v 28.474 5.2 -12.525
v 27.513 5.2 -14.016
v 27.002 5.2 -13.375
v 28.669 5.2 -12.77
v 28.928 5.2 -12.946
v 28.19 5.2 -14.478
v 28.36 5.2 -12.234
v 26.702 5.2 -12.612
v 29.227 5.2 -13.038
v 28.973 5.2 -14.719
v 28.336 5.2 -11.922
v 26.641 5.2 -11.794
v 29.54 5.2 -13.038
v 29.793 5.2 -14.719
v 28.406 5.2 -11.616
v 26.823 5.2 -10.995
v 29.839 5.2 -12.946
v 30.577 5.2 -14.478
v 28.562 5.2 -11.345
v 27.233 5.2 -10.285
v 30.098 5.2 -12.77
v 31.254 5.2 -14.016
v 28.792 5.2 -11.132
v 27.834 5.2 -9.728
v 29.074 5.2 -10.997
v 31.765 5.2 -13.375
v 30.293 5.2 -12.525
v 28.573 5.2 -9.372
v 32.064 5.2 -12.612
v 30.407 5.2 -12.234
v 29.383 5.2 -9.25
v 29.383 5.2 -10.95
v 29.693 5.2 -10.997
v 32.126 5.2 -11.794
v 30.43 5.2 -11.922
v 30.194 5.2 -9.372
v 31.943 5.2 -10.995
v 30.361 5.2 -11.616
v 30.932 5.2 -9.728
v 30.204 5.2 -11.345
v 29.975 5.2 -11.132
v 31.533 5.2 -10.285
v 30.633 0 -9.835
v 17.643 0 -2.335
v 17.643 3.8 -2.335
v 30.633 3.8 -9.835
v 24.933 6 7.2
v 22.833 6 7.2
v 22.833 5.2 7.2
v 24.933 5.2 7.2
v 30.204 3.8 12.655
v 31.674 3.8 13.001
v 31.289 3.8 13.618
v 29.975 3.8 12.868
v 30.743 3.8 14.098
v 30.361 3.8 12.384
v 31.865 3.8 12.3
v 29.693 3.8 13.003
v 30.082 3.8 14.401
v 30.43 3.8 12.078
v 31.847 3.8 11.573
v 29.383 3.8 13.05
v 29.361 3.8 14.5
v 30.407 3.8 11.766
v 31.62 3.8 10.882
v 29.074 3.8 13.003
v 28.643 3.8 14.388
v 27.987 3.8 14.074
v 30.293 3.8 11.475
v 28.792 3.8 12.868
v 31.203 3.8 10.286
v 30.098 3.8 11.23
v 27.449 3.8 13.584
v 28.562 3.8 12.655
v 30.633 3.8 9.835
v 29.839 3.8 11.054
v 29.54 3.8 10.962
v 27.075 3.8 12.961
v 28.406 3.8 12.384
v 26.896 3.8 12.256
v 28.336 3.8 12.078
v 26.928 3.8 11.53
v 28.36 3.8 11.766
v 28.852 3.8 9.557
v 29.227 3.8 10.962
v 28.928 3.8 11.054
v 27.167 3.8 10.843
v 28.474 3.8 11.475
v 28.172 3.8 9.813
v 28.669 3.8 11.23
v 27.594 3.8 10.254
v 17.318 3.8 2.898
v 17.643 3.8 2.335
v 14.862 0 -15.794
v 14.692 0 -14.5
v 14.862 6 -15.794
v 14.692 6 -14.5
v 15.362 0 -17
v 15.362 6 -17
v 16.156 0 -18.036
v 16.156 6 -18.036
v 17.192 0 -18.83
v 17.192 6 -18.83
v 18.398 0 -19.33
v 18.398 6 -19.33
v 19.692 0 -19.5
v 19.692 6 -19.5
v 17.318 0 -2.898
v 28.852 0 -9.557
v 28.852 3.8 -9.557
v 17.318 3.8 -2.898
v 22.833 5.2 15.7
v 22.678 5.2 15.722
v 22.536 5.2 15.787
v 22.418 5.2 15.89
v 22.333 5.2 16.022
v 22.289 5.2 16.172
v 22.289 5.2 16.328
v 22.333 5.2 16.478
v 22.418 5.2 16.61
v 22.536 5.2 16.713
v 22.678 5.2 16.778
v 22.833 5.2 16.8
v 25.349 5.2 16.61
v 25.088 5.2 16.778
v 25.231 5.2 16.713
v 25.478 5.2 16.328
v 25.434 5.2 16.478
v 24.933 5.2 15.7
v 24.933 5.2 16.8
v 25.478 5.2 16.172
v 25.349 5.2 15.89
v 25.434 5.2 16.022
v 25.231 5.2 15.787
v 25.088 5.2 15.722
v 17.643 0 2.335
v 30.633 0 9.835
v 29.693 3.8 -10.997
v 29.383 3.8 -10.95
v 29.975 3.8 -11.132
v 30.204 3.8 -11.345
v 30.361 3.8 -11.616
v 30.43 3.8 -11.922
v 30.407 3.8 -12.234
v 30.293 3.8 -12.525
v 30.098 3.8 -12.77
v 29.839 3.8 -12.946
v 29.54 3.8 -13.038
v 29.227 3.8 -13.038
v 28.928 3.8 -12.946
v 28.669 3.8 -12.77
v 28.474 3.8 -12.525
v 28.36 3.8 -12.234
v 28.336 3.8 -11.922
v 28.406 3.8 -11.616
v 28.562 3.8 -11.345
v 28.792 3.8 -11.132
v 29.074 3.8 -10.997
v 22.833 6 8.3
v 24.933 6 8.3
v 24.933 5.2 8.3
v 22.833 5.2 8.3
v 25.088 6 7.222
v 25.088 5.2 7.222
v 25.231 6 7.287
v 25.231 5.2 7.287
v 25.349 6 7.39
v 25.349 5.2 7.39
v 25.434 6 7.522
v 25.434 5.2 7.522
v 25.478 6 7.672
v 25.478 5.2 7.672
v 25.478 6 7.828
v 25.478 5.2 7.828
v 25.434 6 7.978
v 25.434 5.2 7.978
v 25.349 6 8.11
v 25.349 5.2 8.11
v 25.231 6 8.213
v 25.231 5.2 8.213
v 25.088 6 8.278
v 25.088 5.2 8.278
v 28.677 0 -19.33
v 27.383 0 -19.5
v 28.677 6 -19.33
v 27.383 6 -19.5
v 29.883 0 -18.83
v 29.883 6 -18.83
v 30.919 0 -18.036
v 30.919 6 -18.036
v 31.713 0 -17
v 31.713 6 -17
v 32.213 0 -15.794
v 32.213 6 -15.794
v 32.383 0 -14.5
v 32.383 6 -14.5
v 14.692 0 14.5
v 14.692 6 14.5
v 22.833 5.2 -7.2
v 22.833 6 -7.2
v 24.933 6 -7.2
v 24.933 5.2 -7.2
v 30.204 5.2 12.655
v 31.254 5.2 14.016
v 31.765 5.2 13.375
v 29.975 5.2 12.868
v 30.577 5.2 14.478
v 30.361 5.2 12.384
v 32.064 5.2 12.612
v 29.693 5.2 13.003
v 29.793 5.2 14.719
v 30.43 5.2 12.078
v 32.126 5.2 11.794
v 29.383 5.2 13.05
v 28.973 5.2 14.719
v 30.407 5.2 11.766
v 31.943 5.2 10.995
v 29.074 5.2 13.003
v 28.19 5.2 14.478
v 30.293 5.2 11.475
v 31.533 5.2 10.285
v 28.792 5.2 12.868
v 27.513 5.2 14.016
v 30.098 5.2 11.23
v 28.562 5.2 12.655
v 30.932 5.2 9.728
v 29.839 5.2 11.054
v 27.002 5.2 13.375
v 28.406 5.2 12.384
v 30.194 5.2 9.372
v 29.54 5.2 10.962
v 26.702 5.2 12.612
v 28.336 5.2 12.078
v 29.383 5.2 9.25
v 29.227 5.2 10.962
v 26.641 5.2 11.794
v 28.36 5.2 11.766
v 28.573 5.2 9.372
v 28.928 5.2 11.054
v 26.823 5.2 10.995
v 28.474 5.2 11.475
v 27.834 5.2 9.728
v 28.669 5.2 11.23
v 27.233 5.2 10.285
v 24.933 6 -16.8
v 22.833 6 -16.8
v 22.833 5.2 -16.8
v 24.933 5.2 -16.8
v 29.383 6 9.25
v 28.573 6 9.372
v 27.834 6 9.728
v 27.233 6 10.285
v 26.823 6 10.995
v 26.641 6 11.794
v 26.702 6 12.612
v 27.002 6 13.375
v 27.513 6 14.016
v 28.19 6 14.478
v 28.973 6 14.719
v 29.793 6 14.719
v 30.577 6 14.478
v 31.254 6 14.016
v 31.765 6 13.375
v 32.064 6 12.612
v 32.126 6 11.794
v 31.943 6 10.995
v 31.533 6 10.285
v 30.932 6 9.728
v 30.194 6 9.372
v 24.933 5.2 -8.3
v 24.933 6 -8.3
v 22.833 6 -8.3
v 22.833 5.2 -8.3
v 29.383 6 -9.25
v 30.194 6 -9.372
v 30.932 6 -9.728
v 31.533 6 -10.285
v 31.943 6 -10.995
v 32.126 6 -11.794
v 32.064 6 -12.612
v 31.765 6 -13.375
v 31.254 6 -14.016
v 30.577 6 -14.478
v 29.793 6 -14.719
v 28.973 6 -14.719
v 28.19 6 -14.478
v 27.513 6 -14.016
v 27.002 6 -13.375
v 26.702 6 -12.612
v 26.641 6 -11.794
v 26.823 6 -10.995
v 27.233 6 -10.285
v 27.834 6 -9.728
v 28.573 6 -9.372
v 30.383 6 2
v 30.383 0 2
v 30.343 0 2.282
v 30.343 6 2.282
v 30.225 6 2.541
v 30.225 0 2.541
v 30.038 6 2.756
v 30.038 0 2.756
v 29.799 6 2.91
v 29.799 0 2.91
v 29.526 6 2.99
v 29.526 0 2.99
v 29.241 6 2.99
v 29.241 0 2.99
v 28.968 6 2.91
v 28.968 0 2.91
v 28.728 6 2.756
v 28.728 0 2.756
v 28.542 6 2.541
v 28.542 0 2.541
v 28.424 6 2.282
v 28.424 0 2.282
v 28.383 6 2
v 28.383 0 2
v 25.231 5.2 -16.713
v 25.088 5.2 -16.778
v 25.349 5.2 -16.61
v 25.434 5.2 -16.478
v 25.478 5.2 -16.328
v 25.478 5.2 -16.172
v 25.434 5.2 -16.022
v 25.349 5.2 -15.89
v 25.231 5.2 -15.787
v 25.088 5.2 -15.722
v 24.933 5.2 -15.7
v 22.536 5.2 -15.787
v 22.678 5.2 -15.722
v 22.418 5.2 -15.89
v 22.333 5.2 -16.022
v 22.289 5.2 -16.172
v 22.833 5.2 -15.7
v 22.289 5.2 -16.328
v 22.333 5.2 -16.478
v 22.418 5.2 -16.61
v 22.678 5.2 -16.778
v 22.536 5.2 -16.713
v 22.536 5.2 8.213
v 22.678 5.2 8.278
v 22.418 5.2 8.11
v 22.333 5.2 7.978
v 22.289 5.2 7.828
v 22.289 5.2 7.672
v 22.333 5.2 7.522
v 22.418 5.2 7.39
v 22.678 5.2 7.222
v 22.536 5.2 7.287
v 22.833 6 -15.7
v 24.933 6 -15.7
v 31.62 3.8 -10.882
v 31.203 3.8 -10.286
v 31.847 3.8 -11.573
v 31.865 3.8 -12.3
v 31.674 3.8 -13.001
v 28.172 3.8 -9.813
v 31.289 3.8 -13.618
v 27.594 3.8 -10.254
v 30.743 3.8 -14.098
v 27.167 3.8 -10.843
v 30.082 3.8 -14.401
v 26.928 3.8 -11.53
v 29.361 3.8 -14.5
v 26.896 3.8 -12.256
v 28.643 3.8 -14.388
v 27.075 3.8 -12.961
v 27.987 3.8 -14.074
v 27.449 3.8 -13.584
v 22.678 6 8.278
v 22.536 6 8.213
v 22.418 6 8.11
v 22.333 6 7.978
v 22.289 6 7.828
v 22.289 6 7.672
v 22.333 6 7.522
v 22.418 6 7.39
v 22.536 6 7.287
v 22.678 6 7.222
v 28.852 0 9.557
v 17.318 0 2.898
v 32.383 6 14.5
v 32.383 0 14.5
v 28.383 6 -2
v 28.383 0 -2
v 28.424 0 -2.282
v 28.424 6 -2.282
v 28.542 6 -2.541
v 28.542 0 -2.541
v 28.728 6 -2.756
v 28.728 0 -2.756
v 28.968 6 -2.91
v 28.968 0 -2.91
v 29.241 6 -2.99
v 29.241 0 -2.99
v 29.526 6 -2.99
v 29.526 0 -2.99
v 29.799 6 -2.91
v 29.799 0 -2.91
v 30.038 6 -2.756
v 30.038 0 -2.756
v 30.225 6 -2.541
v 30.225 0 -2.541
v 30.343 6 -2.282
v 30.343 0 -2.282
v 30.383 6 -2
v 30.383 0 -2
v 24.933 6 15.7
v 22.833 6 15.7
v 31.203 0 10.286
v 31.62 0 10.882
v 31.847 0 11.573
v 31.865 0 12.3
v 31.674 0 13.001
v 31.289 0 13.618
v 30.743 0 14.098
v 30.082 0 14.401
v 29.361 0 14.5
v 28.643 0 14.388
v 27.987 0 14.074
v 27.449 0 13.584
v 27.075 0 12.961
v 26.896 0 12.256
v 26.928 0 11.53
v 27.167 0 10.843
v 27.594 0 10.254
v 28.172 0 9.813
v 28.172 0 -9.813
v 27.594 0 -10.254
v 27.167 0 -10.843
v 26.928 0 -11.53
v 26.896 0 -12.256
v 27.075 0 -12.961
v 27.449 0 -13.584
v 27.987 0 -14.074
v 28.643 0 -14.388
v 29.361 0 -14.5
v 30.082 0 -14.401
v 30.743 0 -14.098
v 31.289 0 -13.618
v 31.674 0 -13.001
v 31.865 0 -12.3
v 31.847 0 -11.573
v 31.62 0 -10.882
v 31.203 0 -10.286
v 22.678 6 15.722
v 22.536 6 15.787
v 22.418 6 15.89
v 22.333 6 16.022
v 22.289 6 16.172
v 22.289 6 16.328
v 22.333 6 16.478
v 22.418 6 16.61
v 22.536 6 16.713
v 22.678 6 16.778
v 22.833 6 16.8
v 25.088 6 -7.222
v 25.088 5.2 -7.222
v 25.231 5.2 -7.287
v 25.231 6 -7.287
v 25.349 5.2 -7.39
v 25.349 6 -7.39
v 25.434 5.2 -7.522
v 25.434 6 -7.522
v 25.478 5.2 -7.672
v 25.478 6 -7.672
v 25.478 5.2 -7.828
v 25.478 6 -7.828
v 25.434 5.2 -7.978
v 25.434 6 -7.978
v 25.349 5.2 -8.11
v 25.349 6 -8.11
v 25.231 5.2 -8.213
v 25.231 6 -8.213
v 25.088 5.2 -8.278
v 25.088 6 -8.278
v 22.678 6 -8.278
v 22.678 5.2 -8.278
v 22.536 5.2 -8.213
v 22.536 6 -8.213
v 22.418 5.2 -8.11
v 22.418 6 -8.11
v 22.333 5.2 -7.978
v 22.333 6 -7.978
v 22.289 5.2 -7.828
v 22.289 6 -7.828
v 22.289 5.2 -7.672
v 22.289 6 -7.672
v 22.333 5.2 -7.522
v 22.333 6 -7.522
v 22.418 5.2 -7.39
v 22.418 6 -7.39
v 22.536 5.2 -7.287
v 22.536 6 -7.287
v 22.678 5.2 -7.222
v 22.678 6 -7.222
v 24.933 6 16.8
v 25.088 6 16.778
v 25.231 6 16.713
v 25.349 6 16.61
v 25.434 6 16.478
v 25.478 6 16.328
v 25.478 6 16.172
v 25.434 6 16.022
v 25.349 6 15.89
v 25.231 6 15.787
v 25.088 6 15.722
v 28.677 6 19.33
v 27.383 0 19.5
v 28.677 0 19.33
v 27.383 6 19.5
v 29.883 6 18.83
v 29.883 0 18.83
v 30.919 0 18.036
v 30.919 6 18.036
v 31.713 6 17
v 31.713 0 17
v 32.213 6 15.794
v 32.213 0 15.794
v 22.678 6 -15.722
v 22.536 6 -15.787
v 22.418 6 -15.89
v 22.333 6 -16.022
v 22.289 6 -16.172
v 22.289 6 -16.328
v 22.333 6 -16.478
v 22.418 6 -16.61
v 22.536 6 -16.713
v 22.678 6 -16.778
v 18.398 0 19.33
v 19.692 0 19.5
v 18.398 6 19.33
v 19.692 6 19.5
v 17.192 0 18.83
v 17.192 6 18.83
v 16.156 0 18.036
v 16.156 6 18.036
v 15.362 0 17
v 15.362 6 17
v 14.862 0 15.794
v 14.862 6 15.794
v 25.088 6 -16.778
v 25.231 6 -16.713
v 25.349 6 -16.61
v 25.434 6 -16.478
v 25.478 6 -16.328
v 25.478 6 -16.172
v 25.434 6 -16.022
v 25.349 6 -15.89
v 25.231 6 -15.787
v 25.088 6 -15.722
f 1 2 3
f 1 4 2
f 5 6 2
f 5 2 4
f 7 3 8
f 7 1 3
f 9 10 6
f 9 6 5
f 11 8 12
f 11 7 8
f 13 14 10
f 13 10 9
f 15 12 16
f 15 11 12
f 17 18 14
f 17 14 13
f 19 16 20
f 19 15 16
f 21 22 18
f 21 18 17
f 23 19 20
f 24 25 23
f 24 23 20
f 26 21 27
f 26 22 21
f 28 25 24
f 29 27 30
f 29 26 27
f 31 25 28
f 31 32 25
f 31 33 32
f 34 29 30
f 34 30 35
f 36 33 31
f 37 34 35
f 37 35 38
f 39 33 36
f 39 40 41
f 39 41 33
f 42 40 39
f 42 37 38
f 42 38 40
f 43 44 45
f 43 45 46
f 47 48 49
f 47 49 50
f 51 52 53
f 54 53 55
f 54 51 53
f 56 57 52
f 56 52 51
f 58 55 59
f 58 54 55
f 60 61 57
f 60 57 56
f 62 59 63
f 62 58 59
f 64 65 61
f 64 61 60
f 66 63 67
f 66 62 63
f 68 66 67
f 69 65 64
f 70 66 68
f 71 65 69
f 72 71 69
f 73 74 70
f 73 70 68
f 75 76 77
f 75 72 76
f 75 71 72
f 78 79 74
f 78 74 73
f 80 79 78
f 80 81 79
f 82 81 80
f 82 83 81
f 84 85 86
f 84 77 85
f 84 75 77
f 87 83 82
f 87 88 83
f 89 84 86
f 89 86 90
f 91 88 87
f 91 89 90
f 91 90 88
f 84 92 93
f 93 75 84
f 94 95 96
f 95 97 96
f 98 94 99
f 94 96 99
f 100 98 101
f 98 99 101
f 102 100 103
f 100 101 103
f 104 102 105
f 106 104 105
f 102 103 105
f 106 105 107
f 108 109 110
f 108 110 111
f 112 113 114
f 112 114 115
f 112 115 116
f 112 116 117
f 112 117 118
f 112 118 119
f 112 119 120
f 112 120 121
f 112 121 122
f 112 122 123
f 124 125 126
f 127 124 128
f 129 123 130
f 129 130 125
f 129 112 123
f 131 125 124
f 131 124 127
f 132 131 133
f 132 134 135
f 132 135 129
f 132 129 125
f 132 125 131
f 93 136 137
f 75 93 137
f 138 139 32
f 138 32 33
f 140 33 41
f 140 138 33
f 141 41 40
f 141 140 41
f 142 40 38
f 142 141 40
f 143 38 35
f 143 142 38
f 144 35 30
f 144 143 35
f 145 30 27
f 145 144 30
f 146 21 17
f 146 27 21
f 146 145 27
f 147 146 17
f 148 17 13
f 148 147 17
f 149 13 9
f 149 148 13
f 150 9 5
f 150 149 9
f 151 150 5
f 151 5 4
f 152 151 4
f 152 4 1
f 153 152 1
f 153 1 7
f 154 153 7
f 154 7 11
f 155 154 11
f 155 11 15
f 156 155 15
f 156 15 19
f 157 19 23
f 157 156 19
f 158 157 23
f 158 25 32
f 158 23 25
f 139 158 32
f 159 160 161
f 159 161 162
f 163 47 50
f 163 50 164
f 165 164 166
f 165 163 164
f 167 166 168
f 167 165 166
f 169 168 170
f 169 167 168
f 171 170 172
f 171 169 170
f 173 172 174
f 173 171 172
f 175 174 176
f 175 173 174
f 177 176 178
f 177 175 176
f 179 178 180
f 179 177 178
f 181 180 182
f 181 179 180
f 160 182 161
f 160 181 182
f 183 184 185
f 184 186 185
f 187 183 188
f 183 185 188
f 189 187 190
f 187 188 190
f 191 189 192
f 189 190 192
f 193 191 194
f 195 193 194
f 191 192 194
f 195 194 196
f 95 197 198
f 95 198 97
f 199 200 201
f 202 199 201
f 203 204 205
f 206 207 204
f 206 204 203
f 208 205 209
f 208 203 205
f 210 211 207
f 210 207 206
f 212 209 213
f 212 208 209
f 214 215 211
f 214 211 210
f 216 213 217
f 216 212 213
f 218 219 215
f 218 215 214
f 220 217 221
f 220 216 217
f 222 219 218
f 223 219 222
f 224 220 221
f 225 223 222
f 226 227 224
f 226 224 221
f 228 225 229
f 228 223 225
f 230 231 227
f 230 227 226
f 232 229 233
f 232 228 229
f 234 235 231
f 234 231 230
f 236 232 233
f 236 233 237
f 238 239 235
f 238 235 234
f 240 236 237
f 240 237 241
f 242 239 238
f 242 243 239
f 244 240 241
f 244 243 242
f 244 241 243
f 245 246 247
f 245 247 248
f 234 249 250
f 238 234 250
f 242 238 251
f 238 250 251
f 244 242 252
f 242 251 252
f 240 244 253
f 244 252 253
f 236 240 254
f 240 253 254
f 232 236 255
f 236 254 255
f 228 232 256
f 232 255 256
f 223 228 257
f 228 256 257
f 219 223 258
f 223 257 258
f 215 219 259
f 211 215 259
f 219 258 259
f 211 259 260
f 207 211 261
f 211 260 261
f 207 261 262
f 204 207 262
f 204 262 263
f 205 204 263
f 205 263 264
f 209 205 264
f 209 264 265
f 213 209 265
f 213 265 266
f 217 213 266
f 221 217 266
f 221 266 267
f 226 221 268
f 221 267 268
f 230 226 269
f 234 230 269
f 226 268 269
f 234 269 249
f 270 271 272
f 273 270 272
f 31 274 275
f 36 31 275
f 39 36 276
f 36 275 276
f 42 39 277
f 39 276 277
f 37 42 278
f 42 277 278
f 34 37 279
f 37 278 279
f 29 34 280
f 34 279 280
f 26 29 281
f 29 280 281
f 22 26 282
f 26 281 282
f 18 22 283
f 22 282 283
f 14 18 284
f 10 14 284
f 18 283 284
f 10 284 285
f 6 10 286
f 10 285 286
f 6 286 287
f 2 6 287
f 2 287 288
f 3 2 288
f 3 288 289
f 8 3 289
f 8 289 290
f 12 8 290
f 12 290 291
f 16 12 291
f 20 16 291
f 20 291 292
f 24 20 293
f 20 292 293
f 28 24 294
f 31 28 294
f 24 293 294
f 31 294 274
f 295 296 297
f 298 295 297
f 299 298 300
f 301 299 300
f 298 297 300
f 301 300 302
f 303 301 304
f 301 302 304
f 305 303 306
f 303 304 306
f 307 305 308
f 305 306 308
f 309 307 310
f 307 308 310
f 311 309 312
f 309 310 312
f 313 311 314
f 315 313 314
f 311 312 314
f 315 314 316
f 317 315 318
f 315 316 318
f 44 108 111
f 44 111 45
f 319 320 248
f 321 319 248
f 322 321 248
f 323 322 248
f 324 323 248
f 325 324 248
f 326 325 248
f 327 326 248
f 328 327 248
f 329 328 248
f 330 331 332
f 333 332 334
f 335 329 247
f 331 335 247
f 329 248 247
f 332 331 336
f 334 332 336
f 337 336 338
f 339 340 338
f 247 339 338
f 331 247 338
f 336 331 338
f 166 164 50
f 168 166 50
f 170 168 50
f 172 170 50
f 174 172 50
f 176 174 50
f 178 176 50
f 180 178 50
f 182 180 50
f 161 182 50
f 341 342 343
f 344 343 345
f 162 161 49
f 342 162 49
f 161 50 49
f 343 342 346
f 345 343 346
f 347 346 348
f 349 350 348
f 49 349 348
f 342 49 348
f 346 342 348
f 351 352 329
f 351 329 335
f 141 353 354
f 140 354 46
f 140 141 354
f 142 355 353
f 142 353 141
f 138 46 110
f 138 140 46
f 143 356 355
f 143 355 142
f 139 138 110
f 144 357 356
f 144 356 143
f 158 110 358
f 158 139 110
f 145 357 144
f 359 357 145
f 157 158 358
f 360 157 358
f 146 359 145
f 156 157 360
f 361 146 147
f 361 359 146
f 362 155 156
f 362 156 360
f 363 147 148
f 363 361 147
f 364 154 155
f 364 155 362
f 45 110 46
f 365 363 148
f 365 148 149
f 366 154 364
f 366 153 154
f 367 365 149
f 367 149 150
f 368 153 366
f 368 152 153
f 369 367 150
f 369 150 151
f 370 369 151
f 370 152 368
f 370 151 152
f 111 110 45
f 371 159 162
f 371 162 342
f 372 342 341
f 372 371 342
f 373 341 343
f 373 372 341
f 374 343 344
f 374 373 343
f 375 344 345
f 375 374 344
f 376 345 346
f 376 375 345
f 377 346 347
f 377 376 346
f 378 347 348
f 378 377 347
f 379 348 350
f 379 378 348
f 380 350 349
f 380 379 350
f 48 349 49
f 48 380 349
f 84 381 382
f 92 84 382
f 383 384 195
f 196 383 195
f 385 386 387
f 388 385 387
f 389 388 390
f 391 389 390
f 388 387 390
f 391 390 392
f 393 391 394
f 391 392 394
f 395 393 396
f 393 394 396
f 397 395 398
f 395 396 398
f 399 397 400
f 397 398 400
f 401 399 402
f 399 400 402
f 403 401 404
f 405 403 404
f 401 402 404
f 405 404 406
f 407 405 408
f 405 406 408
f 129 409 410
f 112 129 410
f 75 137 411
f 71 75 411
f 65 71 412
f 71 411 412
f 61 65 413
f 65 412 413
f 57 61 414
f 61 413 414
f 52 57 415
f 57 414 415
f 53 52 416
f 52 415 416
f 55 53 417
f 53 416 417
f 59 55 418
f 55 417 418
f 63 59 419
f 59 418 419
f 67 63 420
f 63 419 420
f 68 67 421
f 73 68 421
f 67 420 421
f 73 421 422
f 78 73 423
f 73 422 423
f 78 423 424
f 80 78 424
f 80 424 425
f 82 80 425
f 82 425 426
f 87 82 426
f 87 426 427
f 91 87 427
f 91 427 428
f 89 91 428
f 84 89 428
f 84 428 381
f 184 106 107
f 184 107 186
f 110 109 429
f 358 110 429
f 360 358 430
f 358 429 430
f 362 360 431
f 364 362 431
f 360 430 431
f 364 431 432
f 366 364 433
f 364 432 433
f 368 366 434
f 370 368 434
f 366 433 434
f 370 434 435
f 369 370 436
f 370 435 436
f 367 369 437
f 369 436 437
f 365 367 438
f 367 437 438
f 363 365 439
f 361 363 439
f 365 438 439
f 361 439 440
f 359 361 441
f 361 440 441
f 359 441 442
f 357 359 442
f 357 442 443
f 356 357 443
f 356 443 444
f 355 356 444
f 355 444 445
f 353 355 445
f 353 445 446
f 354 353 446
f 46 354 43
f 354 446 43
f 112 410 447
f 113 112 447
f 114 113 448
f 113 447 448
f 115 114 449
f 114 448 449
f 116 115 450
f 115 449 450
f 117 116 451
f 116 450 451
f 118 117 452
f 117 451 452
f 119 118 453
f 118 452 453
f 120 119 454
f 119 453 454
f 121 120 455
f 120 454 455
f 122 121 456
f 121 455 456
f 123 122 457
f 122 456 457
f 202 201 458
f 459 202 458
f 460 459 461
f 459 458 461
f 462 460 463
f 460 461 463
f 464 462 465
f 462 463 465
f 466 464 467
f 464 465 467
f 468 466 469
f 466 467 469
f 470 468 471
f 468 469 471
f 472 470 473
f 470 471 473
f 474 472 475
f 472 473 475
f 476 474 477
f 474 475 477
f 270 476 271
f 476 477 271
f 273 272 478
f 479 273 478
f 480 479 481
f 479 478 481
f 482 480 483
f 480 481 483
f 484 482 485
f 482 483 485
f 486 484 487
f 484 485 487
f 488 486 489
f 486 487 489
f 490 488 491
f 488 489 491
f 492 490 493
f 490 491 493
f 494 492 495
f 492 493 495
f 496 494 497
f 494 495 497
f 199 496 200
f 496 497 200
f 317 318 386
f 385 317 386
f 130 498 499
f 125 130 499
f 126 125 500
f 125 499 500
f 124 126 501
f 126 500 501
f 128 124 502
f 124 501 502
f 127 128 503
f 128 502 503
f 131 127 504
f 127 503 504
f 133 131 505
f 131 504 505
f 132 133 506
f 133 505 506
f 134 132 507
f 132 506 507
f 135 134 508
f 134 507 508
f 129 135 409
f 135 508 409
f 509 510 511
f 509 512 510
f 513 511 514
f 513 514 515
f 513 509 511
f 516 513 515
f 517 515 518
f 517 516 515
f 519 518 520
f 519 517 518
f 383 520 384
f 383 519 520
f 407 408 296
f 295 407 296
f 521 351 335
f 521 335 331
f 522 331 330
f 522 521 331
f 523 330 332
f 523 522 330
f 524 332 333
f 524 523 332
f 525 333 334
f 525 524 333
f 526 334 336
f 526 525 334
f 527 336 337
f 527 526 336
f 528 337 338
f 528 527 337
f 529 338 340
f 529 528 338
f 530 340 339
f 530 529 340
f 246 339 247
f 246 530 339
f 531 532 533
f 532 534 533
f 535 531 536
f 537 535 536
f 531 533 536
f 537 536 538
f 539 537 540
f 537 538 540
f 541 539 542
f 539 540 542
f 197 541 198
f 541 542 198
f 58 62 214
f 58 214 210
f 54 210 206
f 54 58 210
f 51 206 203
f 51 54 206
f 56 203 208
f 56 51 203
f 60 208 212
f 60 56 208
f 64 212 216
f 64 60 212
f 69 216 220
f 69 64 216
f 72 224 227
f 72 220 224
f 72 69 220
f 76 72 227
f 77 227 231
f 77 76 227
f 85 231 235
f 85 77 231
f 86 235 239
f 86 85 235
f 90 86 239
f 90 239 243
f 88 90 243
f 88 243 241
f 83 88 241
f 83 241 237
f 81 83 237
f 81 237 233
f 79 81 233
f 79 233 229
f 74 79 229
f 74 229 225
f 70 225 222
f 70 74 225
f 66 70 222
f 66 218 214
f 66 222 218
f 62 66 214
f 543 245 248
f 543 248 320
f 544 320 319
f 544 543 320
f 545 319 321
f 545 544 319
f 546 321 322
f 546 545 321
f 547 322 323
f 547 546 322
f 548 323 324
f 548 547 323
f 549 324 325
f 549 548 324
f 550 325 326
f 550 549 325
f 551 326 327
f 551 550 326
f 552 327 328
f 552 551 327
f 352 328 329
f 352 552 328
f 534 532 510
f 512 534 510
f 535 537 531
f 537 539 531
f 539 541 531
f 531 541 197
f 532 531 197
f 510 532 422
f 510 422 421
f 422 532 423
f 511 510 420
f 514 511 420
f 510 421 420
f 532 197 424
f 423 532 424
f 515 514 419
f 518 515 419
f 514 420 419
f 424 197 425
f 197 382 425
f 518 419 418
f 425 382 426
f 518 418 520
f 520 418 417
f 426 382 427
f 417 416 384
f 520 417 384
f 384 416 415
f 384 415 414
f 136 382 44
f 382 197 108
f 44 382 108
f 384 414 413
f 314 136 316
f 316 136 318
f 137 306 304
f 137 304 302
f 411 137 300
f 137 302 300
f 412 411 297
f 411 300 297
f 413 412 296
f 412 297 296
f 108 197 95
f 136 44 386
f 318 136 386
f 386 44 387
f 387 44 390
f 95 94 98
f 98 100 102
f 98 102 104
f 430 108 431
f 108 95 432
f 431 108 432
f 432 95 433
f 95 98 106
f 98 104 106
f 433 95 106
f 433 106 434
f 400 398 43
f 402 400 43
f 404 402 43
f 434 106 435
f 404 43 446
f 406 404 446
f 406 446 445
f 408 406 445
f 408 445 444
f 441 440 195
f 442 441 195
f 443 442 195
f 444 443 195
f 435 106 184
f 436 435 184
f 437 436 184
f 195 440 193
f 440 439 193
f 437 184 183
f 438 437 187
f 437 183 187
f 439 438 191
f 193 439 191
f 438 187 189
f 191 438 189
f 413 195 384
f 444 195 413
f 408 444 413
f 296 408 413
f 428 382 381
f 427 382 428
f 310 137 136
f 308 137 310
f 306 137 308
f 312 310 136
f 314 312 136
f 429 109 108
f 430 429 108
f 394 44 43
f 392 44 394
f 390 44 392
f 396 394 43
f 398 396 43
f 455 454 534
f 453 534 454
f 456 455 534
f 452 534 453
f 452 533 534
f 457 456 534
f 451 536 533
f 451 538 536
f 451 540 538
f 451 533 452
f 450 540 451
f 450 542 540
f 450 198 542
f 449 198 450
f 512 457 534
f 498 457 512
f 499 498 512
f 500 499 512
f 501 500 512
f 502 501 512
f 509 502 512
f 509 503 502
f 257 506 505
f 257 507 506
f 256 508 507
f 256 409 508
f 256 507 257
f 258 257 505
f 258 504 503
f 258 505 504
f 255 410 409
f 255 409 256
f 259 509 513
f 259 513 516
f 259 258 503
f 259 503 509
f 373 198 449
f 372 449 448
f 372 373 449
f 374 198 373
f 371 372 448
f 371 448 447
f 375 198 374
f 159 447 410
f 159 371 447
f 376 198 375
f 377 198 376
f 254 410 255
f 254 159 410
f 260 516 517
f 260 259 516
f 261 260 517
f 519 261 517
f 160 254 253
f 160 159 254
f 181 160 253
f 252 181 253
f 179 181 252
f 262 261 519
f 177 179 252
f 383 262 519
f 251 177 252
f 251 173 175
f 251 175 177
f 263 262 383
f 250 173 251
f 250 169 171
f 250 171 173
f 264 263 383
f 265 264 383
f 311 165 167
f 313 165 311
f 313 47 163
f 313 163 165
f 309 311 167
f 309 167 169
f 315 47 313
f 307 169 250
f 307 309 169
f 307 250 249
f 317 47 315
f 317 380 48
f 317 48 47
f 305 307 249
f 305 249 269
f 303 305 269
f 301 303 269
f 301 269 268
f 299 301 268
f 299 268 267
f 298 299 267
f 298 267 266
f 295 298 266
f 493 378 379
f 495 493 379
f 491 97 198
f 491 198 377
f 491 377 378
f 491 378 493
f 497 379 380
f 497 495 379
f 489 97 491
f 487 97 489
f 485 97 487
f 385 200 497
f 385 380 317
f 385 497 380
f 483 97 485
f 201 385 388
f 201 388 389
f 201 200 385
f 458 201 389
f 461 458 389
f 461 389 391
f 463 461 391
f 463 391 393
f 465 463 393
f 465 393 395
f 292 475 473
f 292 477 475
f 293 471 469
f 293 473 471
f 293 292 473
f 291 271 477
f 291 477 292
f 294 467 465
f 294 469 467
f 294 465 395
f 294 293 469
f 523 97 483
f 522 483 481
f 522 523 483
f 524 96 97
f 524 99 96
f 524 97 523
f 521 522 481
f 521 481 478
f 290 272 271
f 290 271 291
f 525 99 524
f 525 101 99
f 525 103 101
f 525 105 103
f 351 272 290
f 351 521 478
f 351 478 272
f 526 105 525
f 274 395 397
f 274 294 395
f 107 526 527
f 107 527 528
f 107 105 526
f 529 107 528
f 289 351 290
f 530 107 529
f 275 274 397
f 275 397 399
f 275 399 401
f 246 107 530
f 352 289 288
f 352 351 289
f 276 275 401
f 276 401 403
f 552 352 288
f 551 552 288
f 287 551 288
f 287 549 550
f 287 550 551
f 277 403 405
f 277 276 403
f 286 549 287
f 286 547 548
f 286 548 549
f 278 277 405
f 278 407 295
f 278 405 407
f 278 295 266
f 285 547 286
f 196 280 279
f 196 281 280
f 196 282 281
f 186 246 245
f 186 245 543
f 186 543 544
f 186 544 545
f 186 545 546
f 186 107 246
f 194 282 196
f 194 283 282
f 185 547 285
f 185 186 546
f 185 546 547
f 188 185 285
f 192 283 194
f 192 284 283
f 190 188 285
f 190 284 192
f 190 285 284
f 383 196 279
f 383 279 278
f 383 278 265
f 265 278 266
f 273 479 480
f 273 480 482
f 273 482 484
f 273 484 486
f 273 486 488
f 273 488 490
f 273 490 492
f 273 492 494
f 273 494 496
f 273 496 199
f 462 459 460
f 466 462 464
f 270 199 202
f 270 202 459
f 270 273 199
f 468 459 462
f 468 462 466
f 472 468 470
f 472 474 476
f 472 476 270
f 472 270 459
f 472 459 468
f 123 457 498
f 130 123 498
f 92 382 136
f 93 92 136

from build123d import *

# Parameters (mm, degrees)
SKETCH1_W           = 17.691665124
SKETCH1_H           = 39
SKETCH1_R           = 1.05
BOSS_EXTRUDE1_DEPTH = 6
SKETCH6_R           = 2.5
CUT_EXTRUDE1_DEPTH  = 3.8
FILLET1_R           = 5
FILLET2_R           = 5
SKETCH7_R           = 2.75
CUT_EXTRUDE2_DEPTH  = 0.8


with BuildPart() as part:
    # Sketch1 → Boss-Extrude1 (new body)
    with BuildSketch(Plane(origin=(0, 0, 0), x_dir=(1, 0, 0), z_dir=(0, 1, 0))):
        with Locations((23.537497687, 0)):
            Rectangle(SKETCH1_W, SKETCH1_H)
        with Locations(Location((29.383330249, -12, 0), (0, 0, 270))):
            Circle(SKETCH1_R, mode=Mode.SUBTRACT)
        with BuildLine():
            ThreePointArc((30.383330249, -2), (29.383330249, -3), (28.383330249, -2))
            Line((28.383330249, -2), (28.383330249, 2))
            ThreePointArc((28.383330249, 2), (29.383330249, 3), (30.383330249, 2))
            Line((30.383330249, 2), (30.383330249, -2))
        make_face(mode=Mode.SUBTRACT)
        with Locations(Location((29.383330249, 12, 0), (0, 0, 270))):
            Circle(SKETCH1_R, mode=Mode.SUBTRACT)
    extrude(amount=BOSS_EXTRUDE1_DEPTH)

    # Sketch6 → Cut-Extrude1 (cut)
    with BuildSketch(Plane(origin=(0, 0, 0), x_dir=(-1, 0, 0), z_dir=(0, -1, 0))):
        with Locations((-29.383330249, -12)):
            Circle(SKETCH6_R)
        with Locations((-29.383330249, 12)):
            Circle(SKETCH6_R)
        Polygon((-30.633330249, -9.834936491), (-30.308330249, -10.397853003), (-17.317949192, -2.897853003), (-17.642949192, -2.334936491), align=None)
        Polygon((-30.633330249, 9.834936491), (-30.308330249, 10.397853003), (-17.317949192, 2.897853003), (-17.642949192, 2.334936491), align=None)
    extrude(amount=-CUT_EXTRUDE1_DEPTH, mode=Mode.SUBTRACT)

    # Fillet1
    fillet1_edges = [part.edges().sort_by_distance(p)[0] for p in [
        (32.383330249, 3, 19.5),
        (32.383330249, 3, -19.5),
    ]]
    fillet(fillet1_edges, radius=FILLET1_R)

    # Fillet2
    fillet2_edges = [part.edges().sort_by_distance(p)[0] for p in [
        (14.691665125, 3, 19.5),
        (14.691665125, 3, -19.5),
    ]]
    fillet(fillet2_edges, radius=FILLET2_R)

    # Sketch7 → Cut-Extrude2 (cut)
    with BuildSketch(Plane(origin=(0, 6, 0), x_dir=(1, 0, 0), z_dir=(0, 1, 0))):
        with Locations(Location((29.383330249, 12, 0), (0, 0, 270))):
            Circle(SKETCH7_R)
        with Locations(Location((29.383330249, -12, 0), (0, 0, 90))):
            Circle(SKETCH7_R)
        with BuildLine():
            Line((22.833330249, 16.8), (24.933330249, 16.8))
            ThreePointArc((24.933330249, 16.8), (25.483330249, 16.25), (24.933330249, 15.7))
            Line((24.933330249, 15.7), (22.833330249, 15.7))
            ThreePointArc((22.833330249, 15.7), (22.283330249, 16.25), (22.833330249, 16.8))
        make_face()
        with BuildLine():
            Line((22.833330249, 7.2), (24.933330249, 7.2))
            ThreePointArc((24.933330249, 7.2), (25.483330249, 7.75), (24.933330249, 8.3))
            Line((24.933330249, 8.3), (22.833330249, 8.3))
            ThreePointArc((22.833330249, 8.3), (22.283330249, 7.75), (22.833330249, 7.2))
        make_face()
        with BuildLine():
            Line((22.833330249, -7.2), (24.933330249, -7.2))
            ThreePointArc((24.933330249, -7.2), (25.483330249, -7.75), (24.933330249, -8.3))
            Line((24.933330249, -8.3), (22.833330249, -8.3))
            ThreePointArc((22.833330249, -8.3), (22.283330249, -7.75), (22.833330249, -7.2))
        make_face()
        with BuildLine():
            Line((22.833330249, -16.8), (24.933330249, -16.8))
            ThreePointArc((24.933330249, -16.8), (25.483330249, -16.25), (24.933330249, -15.7))
            Line((24.933330249, -15.7), (22.833330249, -15.7))
            ThreePointArc((22.833330249, -15.7), (22.283330249, -16.25), (22.833330249, -16.8))
        make_face()
    extrude(amount=-CUT_EXTRUDE2_DEPTH, mode=Mode.SUBTRACT)


solid = part.part
